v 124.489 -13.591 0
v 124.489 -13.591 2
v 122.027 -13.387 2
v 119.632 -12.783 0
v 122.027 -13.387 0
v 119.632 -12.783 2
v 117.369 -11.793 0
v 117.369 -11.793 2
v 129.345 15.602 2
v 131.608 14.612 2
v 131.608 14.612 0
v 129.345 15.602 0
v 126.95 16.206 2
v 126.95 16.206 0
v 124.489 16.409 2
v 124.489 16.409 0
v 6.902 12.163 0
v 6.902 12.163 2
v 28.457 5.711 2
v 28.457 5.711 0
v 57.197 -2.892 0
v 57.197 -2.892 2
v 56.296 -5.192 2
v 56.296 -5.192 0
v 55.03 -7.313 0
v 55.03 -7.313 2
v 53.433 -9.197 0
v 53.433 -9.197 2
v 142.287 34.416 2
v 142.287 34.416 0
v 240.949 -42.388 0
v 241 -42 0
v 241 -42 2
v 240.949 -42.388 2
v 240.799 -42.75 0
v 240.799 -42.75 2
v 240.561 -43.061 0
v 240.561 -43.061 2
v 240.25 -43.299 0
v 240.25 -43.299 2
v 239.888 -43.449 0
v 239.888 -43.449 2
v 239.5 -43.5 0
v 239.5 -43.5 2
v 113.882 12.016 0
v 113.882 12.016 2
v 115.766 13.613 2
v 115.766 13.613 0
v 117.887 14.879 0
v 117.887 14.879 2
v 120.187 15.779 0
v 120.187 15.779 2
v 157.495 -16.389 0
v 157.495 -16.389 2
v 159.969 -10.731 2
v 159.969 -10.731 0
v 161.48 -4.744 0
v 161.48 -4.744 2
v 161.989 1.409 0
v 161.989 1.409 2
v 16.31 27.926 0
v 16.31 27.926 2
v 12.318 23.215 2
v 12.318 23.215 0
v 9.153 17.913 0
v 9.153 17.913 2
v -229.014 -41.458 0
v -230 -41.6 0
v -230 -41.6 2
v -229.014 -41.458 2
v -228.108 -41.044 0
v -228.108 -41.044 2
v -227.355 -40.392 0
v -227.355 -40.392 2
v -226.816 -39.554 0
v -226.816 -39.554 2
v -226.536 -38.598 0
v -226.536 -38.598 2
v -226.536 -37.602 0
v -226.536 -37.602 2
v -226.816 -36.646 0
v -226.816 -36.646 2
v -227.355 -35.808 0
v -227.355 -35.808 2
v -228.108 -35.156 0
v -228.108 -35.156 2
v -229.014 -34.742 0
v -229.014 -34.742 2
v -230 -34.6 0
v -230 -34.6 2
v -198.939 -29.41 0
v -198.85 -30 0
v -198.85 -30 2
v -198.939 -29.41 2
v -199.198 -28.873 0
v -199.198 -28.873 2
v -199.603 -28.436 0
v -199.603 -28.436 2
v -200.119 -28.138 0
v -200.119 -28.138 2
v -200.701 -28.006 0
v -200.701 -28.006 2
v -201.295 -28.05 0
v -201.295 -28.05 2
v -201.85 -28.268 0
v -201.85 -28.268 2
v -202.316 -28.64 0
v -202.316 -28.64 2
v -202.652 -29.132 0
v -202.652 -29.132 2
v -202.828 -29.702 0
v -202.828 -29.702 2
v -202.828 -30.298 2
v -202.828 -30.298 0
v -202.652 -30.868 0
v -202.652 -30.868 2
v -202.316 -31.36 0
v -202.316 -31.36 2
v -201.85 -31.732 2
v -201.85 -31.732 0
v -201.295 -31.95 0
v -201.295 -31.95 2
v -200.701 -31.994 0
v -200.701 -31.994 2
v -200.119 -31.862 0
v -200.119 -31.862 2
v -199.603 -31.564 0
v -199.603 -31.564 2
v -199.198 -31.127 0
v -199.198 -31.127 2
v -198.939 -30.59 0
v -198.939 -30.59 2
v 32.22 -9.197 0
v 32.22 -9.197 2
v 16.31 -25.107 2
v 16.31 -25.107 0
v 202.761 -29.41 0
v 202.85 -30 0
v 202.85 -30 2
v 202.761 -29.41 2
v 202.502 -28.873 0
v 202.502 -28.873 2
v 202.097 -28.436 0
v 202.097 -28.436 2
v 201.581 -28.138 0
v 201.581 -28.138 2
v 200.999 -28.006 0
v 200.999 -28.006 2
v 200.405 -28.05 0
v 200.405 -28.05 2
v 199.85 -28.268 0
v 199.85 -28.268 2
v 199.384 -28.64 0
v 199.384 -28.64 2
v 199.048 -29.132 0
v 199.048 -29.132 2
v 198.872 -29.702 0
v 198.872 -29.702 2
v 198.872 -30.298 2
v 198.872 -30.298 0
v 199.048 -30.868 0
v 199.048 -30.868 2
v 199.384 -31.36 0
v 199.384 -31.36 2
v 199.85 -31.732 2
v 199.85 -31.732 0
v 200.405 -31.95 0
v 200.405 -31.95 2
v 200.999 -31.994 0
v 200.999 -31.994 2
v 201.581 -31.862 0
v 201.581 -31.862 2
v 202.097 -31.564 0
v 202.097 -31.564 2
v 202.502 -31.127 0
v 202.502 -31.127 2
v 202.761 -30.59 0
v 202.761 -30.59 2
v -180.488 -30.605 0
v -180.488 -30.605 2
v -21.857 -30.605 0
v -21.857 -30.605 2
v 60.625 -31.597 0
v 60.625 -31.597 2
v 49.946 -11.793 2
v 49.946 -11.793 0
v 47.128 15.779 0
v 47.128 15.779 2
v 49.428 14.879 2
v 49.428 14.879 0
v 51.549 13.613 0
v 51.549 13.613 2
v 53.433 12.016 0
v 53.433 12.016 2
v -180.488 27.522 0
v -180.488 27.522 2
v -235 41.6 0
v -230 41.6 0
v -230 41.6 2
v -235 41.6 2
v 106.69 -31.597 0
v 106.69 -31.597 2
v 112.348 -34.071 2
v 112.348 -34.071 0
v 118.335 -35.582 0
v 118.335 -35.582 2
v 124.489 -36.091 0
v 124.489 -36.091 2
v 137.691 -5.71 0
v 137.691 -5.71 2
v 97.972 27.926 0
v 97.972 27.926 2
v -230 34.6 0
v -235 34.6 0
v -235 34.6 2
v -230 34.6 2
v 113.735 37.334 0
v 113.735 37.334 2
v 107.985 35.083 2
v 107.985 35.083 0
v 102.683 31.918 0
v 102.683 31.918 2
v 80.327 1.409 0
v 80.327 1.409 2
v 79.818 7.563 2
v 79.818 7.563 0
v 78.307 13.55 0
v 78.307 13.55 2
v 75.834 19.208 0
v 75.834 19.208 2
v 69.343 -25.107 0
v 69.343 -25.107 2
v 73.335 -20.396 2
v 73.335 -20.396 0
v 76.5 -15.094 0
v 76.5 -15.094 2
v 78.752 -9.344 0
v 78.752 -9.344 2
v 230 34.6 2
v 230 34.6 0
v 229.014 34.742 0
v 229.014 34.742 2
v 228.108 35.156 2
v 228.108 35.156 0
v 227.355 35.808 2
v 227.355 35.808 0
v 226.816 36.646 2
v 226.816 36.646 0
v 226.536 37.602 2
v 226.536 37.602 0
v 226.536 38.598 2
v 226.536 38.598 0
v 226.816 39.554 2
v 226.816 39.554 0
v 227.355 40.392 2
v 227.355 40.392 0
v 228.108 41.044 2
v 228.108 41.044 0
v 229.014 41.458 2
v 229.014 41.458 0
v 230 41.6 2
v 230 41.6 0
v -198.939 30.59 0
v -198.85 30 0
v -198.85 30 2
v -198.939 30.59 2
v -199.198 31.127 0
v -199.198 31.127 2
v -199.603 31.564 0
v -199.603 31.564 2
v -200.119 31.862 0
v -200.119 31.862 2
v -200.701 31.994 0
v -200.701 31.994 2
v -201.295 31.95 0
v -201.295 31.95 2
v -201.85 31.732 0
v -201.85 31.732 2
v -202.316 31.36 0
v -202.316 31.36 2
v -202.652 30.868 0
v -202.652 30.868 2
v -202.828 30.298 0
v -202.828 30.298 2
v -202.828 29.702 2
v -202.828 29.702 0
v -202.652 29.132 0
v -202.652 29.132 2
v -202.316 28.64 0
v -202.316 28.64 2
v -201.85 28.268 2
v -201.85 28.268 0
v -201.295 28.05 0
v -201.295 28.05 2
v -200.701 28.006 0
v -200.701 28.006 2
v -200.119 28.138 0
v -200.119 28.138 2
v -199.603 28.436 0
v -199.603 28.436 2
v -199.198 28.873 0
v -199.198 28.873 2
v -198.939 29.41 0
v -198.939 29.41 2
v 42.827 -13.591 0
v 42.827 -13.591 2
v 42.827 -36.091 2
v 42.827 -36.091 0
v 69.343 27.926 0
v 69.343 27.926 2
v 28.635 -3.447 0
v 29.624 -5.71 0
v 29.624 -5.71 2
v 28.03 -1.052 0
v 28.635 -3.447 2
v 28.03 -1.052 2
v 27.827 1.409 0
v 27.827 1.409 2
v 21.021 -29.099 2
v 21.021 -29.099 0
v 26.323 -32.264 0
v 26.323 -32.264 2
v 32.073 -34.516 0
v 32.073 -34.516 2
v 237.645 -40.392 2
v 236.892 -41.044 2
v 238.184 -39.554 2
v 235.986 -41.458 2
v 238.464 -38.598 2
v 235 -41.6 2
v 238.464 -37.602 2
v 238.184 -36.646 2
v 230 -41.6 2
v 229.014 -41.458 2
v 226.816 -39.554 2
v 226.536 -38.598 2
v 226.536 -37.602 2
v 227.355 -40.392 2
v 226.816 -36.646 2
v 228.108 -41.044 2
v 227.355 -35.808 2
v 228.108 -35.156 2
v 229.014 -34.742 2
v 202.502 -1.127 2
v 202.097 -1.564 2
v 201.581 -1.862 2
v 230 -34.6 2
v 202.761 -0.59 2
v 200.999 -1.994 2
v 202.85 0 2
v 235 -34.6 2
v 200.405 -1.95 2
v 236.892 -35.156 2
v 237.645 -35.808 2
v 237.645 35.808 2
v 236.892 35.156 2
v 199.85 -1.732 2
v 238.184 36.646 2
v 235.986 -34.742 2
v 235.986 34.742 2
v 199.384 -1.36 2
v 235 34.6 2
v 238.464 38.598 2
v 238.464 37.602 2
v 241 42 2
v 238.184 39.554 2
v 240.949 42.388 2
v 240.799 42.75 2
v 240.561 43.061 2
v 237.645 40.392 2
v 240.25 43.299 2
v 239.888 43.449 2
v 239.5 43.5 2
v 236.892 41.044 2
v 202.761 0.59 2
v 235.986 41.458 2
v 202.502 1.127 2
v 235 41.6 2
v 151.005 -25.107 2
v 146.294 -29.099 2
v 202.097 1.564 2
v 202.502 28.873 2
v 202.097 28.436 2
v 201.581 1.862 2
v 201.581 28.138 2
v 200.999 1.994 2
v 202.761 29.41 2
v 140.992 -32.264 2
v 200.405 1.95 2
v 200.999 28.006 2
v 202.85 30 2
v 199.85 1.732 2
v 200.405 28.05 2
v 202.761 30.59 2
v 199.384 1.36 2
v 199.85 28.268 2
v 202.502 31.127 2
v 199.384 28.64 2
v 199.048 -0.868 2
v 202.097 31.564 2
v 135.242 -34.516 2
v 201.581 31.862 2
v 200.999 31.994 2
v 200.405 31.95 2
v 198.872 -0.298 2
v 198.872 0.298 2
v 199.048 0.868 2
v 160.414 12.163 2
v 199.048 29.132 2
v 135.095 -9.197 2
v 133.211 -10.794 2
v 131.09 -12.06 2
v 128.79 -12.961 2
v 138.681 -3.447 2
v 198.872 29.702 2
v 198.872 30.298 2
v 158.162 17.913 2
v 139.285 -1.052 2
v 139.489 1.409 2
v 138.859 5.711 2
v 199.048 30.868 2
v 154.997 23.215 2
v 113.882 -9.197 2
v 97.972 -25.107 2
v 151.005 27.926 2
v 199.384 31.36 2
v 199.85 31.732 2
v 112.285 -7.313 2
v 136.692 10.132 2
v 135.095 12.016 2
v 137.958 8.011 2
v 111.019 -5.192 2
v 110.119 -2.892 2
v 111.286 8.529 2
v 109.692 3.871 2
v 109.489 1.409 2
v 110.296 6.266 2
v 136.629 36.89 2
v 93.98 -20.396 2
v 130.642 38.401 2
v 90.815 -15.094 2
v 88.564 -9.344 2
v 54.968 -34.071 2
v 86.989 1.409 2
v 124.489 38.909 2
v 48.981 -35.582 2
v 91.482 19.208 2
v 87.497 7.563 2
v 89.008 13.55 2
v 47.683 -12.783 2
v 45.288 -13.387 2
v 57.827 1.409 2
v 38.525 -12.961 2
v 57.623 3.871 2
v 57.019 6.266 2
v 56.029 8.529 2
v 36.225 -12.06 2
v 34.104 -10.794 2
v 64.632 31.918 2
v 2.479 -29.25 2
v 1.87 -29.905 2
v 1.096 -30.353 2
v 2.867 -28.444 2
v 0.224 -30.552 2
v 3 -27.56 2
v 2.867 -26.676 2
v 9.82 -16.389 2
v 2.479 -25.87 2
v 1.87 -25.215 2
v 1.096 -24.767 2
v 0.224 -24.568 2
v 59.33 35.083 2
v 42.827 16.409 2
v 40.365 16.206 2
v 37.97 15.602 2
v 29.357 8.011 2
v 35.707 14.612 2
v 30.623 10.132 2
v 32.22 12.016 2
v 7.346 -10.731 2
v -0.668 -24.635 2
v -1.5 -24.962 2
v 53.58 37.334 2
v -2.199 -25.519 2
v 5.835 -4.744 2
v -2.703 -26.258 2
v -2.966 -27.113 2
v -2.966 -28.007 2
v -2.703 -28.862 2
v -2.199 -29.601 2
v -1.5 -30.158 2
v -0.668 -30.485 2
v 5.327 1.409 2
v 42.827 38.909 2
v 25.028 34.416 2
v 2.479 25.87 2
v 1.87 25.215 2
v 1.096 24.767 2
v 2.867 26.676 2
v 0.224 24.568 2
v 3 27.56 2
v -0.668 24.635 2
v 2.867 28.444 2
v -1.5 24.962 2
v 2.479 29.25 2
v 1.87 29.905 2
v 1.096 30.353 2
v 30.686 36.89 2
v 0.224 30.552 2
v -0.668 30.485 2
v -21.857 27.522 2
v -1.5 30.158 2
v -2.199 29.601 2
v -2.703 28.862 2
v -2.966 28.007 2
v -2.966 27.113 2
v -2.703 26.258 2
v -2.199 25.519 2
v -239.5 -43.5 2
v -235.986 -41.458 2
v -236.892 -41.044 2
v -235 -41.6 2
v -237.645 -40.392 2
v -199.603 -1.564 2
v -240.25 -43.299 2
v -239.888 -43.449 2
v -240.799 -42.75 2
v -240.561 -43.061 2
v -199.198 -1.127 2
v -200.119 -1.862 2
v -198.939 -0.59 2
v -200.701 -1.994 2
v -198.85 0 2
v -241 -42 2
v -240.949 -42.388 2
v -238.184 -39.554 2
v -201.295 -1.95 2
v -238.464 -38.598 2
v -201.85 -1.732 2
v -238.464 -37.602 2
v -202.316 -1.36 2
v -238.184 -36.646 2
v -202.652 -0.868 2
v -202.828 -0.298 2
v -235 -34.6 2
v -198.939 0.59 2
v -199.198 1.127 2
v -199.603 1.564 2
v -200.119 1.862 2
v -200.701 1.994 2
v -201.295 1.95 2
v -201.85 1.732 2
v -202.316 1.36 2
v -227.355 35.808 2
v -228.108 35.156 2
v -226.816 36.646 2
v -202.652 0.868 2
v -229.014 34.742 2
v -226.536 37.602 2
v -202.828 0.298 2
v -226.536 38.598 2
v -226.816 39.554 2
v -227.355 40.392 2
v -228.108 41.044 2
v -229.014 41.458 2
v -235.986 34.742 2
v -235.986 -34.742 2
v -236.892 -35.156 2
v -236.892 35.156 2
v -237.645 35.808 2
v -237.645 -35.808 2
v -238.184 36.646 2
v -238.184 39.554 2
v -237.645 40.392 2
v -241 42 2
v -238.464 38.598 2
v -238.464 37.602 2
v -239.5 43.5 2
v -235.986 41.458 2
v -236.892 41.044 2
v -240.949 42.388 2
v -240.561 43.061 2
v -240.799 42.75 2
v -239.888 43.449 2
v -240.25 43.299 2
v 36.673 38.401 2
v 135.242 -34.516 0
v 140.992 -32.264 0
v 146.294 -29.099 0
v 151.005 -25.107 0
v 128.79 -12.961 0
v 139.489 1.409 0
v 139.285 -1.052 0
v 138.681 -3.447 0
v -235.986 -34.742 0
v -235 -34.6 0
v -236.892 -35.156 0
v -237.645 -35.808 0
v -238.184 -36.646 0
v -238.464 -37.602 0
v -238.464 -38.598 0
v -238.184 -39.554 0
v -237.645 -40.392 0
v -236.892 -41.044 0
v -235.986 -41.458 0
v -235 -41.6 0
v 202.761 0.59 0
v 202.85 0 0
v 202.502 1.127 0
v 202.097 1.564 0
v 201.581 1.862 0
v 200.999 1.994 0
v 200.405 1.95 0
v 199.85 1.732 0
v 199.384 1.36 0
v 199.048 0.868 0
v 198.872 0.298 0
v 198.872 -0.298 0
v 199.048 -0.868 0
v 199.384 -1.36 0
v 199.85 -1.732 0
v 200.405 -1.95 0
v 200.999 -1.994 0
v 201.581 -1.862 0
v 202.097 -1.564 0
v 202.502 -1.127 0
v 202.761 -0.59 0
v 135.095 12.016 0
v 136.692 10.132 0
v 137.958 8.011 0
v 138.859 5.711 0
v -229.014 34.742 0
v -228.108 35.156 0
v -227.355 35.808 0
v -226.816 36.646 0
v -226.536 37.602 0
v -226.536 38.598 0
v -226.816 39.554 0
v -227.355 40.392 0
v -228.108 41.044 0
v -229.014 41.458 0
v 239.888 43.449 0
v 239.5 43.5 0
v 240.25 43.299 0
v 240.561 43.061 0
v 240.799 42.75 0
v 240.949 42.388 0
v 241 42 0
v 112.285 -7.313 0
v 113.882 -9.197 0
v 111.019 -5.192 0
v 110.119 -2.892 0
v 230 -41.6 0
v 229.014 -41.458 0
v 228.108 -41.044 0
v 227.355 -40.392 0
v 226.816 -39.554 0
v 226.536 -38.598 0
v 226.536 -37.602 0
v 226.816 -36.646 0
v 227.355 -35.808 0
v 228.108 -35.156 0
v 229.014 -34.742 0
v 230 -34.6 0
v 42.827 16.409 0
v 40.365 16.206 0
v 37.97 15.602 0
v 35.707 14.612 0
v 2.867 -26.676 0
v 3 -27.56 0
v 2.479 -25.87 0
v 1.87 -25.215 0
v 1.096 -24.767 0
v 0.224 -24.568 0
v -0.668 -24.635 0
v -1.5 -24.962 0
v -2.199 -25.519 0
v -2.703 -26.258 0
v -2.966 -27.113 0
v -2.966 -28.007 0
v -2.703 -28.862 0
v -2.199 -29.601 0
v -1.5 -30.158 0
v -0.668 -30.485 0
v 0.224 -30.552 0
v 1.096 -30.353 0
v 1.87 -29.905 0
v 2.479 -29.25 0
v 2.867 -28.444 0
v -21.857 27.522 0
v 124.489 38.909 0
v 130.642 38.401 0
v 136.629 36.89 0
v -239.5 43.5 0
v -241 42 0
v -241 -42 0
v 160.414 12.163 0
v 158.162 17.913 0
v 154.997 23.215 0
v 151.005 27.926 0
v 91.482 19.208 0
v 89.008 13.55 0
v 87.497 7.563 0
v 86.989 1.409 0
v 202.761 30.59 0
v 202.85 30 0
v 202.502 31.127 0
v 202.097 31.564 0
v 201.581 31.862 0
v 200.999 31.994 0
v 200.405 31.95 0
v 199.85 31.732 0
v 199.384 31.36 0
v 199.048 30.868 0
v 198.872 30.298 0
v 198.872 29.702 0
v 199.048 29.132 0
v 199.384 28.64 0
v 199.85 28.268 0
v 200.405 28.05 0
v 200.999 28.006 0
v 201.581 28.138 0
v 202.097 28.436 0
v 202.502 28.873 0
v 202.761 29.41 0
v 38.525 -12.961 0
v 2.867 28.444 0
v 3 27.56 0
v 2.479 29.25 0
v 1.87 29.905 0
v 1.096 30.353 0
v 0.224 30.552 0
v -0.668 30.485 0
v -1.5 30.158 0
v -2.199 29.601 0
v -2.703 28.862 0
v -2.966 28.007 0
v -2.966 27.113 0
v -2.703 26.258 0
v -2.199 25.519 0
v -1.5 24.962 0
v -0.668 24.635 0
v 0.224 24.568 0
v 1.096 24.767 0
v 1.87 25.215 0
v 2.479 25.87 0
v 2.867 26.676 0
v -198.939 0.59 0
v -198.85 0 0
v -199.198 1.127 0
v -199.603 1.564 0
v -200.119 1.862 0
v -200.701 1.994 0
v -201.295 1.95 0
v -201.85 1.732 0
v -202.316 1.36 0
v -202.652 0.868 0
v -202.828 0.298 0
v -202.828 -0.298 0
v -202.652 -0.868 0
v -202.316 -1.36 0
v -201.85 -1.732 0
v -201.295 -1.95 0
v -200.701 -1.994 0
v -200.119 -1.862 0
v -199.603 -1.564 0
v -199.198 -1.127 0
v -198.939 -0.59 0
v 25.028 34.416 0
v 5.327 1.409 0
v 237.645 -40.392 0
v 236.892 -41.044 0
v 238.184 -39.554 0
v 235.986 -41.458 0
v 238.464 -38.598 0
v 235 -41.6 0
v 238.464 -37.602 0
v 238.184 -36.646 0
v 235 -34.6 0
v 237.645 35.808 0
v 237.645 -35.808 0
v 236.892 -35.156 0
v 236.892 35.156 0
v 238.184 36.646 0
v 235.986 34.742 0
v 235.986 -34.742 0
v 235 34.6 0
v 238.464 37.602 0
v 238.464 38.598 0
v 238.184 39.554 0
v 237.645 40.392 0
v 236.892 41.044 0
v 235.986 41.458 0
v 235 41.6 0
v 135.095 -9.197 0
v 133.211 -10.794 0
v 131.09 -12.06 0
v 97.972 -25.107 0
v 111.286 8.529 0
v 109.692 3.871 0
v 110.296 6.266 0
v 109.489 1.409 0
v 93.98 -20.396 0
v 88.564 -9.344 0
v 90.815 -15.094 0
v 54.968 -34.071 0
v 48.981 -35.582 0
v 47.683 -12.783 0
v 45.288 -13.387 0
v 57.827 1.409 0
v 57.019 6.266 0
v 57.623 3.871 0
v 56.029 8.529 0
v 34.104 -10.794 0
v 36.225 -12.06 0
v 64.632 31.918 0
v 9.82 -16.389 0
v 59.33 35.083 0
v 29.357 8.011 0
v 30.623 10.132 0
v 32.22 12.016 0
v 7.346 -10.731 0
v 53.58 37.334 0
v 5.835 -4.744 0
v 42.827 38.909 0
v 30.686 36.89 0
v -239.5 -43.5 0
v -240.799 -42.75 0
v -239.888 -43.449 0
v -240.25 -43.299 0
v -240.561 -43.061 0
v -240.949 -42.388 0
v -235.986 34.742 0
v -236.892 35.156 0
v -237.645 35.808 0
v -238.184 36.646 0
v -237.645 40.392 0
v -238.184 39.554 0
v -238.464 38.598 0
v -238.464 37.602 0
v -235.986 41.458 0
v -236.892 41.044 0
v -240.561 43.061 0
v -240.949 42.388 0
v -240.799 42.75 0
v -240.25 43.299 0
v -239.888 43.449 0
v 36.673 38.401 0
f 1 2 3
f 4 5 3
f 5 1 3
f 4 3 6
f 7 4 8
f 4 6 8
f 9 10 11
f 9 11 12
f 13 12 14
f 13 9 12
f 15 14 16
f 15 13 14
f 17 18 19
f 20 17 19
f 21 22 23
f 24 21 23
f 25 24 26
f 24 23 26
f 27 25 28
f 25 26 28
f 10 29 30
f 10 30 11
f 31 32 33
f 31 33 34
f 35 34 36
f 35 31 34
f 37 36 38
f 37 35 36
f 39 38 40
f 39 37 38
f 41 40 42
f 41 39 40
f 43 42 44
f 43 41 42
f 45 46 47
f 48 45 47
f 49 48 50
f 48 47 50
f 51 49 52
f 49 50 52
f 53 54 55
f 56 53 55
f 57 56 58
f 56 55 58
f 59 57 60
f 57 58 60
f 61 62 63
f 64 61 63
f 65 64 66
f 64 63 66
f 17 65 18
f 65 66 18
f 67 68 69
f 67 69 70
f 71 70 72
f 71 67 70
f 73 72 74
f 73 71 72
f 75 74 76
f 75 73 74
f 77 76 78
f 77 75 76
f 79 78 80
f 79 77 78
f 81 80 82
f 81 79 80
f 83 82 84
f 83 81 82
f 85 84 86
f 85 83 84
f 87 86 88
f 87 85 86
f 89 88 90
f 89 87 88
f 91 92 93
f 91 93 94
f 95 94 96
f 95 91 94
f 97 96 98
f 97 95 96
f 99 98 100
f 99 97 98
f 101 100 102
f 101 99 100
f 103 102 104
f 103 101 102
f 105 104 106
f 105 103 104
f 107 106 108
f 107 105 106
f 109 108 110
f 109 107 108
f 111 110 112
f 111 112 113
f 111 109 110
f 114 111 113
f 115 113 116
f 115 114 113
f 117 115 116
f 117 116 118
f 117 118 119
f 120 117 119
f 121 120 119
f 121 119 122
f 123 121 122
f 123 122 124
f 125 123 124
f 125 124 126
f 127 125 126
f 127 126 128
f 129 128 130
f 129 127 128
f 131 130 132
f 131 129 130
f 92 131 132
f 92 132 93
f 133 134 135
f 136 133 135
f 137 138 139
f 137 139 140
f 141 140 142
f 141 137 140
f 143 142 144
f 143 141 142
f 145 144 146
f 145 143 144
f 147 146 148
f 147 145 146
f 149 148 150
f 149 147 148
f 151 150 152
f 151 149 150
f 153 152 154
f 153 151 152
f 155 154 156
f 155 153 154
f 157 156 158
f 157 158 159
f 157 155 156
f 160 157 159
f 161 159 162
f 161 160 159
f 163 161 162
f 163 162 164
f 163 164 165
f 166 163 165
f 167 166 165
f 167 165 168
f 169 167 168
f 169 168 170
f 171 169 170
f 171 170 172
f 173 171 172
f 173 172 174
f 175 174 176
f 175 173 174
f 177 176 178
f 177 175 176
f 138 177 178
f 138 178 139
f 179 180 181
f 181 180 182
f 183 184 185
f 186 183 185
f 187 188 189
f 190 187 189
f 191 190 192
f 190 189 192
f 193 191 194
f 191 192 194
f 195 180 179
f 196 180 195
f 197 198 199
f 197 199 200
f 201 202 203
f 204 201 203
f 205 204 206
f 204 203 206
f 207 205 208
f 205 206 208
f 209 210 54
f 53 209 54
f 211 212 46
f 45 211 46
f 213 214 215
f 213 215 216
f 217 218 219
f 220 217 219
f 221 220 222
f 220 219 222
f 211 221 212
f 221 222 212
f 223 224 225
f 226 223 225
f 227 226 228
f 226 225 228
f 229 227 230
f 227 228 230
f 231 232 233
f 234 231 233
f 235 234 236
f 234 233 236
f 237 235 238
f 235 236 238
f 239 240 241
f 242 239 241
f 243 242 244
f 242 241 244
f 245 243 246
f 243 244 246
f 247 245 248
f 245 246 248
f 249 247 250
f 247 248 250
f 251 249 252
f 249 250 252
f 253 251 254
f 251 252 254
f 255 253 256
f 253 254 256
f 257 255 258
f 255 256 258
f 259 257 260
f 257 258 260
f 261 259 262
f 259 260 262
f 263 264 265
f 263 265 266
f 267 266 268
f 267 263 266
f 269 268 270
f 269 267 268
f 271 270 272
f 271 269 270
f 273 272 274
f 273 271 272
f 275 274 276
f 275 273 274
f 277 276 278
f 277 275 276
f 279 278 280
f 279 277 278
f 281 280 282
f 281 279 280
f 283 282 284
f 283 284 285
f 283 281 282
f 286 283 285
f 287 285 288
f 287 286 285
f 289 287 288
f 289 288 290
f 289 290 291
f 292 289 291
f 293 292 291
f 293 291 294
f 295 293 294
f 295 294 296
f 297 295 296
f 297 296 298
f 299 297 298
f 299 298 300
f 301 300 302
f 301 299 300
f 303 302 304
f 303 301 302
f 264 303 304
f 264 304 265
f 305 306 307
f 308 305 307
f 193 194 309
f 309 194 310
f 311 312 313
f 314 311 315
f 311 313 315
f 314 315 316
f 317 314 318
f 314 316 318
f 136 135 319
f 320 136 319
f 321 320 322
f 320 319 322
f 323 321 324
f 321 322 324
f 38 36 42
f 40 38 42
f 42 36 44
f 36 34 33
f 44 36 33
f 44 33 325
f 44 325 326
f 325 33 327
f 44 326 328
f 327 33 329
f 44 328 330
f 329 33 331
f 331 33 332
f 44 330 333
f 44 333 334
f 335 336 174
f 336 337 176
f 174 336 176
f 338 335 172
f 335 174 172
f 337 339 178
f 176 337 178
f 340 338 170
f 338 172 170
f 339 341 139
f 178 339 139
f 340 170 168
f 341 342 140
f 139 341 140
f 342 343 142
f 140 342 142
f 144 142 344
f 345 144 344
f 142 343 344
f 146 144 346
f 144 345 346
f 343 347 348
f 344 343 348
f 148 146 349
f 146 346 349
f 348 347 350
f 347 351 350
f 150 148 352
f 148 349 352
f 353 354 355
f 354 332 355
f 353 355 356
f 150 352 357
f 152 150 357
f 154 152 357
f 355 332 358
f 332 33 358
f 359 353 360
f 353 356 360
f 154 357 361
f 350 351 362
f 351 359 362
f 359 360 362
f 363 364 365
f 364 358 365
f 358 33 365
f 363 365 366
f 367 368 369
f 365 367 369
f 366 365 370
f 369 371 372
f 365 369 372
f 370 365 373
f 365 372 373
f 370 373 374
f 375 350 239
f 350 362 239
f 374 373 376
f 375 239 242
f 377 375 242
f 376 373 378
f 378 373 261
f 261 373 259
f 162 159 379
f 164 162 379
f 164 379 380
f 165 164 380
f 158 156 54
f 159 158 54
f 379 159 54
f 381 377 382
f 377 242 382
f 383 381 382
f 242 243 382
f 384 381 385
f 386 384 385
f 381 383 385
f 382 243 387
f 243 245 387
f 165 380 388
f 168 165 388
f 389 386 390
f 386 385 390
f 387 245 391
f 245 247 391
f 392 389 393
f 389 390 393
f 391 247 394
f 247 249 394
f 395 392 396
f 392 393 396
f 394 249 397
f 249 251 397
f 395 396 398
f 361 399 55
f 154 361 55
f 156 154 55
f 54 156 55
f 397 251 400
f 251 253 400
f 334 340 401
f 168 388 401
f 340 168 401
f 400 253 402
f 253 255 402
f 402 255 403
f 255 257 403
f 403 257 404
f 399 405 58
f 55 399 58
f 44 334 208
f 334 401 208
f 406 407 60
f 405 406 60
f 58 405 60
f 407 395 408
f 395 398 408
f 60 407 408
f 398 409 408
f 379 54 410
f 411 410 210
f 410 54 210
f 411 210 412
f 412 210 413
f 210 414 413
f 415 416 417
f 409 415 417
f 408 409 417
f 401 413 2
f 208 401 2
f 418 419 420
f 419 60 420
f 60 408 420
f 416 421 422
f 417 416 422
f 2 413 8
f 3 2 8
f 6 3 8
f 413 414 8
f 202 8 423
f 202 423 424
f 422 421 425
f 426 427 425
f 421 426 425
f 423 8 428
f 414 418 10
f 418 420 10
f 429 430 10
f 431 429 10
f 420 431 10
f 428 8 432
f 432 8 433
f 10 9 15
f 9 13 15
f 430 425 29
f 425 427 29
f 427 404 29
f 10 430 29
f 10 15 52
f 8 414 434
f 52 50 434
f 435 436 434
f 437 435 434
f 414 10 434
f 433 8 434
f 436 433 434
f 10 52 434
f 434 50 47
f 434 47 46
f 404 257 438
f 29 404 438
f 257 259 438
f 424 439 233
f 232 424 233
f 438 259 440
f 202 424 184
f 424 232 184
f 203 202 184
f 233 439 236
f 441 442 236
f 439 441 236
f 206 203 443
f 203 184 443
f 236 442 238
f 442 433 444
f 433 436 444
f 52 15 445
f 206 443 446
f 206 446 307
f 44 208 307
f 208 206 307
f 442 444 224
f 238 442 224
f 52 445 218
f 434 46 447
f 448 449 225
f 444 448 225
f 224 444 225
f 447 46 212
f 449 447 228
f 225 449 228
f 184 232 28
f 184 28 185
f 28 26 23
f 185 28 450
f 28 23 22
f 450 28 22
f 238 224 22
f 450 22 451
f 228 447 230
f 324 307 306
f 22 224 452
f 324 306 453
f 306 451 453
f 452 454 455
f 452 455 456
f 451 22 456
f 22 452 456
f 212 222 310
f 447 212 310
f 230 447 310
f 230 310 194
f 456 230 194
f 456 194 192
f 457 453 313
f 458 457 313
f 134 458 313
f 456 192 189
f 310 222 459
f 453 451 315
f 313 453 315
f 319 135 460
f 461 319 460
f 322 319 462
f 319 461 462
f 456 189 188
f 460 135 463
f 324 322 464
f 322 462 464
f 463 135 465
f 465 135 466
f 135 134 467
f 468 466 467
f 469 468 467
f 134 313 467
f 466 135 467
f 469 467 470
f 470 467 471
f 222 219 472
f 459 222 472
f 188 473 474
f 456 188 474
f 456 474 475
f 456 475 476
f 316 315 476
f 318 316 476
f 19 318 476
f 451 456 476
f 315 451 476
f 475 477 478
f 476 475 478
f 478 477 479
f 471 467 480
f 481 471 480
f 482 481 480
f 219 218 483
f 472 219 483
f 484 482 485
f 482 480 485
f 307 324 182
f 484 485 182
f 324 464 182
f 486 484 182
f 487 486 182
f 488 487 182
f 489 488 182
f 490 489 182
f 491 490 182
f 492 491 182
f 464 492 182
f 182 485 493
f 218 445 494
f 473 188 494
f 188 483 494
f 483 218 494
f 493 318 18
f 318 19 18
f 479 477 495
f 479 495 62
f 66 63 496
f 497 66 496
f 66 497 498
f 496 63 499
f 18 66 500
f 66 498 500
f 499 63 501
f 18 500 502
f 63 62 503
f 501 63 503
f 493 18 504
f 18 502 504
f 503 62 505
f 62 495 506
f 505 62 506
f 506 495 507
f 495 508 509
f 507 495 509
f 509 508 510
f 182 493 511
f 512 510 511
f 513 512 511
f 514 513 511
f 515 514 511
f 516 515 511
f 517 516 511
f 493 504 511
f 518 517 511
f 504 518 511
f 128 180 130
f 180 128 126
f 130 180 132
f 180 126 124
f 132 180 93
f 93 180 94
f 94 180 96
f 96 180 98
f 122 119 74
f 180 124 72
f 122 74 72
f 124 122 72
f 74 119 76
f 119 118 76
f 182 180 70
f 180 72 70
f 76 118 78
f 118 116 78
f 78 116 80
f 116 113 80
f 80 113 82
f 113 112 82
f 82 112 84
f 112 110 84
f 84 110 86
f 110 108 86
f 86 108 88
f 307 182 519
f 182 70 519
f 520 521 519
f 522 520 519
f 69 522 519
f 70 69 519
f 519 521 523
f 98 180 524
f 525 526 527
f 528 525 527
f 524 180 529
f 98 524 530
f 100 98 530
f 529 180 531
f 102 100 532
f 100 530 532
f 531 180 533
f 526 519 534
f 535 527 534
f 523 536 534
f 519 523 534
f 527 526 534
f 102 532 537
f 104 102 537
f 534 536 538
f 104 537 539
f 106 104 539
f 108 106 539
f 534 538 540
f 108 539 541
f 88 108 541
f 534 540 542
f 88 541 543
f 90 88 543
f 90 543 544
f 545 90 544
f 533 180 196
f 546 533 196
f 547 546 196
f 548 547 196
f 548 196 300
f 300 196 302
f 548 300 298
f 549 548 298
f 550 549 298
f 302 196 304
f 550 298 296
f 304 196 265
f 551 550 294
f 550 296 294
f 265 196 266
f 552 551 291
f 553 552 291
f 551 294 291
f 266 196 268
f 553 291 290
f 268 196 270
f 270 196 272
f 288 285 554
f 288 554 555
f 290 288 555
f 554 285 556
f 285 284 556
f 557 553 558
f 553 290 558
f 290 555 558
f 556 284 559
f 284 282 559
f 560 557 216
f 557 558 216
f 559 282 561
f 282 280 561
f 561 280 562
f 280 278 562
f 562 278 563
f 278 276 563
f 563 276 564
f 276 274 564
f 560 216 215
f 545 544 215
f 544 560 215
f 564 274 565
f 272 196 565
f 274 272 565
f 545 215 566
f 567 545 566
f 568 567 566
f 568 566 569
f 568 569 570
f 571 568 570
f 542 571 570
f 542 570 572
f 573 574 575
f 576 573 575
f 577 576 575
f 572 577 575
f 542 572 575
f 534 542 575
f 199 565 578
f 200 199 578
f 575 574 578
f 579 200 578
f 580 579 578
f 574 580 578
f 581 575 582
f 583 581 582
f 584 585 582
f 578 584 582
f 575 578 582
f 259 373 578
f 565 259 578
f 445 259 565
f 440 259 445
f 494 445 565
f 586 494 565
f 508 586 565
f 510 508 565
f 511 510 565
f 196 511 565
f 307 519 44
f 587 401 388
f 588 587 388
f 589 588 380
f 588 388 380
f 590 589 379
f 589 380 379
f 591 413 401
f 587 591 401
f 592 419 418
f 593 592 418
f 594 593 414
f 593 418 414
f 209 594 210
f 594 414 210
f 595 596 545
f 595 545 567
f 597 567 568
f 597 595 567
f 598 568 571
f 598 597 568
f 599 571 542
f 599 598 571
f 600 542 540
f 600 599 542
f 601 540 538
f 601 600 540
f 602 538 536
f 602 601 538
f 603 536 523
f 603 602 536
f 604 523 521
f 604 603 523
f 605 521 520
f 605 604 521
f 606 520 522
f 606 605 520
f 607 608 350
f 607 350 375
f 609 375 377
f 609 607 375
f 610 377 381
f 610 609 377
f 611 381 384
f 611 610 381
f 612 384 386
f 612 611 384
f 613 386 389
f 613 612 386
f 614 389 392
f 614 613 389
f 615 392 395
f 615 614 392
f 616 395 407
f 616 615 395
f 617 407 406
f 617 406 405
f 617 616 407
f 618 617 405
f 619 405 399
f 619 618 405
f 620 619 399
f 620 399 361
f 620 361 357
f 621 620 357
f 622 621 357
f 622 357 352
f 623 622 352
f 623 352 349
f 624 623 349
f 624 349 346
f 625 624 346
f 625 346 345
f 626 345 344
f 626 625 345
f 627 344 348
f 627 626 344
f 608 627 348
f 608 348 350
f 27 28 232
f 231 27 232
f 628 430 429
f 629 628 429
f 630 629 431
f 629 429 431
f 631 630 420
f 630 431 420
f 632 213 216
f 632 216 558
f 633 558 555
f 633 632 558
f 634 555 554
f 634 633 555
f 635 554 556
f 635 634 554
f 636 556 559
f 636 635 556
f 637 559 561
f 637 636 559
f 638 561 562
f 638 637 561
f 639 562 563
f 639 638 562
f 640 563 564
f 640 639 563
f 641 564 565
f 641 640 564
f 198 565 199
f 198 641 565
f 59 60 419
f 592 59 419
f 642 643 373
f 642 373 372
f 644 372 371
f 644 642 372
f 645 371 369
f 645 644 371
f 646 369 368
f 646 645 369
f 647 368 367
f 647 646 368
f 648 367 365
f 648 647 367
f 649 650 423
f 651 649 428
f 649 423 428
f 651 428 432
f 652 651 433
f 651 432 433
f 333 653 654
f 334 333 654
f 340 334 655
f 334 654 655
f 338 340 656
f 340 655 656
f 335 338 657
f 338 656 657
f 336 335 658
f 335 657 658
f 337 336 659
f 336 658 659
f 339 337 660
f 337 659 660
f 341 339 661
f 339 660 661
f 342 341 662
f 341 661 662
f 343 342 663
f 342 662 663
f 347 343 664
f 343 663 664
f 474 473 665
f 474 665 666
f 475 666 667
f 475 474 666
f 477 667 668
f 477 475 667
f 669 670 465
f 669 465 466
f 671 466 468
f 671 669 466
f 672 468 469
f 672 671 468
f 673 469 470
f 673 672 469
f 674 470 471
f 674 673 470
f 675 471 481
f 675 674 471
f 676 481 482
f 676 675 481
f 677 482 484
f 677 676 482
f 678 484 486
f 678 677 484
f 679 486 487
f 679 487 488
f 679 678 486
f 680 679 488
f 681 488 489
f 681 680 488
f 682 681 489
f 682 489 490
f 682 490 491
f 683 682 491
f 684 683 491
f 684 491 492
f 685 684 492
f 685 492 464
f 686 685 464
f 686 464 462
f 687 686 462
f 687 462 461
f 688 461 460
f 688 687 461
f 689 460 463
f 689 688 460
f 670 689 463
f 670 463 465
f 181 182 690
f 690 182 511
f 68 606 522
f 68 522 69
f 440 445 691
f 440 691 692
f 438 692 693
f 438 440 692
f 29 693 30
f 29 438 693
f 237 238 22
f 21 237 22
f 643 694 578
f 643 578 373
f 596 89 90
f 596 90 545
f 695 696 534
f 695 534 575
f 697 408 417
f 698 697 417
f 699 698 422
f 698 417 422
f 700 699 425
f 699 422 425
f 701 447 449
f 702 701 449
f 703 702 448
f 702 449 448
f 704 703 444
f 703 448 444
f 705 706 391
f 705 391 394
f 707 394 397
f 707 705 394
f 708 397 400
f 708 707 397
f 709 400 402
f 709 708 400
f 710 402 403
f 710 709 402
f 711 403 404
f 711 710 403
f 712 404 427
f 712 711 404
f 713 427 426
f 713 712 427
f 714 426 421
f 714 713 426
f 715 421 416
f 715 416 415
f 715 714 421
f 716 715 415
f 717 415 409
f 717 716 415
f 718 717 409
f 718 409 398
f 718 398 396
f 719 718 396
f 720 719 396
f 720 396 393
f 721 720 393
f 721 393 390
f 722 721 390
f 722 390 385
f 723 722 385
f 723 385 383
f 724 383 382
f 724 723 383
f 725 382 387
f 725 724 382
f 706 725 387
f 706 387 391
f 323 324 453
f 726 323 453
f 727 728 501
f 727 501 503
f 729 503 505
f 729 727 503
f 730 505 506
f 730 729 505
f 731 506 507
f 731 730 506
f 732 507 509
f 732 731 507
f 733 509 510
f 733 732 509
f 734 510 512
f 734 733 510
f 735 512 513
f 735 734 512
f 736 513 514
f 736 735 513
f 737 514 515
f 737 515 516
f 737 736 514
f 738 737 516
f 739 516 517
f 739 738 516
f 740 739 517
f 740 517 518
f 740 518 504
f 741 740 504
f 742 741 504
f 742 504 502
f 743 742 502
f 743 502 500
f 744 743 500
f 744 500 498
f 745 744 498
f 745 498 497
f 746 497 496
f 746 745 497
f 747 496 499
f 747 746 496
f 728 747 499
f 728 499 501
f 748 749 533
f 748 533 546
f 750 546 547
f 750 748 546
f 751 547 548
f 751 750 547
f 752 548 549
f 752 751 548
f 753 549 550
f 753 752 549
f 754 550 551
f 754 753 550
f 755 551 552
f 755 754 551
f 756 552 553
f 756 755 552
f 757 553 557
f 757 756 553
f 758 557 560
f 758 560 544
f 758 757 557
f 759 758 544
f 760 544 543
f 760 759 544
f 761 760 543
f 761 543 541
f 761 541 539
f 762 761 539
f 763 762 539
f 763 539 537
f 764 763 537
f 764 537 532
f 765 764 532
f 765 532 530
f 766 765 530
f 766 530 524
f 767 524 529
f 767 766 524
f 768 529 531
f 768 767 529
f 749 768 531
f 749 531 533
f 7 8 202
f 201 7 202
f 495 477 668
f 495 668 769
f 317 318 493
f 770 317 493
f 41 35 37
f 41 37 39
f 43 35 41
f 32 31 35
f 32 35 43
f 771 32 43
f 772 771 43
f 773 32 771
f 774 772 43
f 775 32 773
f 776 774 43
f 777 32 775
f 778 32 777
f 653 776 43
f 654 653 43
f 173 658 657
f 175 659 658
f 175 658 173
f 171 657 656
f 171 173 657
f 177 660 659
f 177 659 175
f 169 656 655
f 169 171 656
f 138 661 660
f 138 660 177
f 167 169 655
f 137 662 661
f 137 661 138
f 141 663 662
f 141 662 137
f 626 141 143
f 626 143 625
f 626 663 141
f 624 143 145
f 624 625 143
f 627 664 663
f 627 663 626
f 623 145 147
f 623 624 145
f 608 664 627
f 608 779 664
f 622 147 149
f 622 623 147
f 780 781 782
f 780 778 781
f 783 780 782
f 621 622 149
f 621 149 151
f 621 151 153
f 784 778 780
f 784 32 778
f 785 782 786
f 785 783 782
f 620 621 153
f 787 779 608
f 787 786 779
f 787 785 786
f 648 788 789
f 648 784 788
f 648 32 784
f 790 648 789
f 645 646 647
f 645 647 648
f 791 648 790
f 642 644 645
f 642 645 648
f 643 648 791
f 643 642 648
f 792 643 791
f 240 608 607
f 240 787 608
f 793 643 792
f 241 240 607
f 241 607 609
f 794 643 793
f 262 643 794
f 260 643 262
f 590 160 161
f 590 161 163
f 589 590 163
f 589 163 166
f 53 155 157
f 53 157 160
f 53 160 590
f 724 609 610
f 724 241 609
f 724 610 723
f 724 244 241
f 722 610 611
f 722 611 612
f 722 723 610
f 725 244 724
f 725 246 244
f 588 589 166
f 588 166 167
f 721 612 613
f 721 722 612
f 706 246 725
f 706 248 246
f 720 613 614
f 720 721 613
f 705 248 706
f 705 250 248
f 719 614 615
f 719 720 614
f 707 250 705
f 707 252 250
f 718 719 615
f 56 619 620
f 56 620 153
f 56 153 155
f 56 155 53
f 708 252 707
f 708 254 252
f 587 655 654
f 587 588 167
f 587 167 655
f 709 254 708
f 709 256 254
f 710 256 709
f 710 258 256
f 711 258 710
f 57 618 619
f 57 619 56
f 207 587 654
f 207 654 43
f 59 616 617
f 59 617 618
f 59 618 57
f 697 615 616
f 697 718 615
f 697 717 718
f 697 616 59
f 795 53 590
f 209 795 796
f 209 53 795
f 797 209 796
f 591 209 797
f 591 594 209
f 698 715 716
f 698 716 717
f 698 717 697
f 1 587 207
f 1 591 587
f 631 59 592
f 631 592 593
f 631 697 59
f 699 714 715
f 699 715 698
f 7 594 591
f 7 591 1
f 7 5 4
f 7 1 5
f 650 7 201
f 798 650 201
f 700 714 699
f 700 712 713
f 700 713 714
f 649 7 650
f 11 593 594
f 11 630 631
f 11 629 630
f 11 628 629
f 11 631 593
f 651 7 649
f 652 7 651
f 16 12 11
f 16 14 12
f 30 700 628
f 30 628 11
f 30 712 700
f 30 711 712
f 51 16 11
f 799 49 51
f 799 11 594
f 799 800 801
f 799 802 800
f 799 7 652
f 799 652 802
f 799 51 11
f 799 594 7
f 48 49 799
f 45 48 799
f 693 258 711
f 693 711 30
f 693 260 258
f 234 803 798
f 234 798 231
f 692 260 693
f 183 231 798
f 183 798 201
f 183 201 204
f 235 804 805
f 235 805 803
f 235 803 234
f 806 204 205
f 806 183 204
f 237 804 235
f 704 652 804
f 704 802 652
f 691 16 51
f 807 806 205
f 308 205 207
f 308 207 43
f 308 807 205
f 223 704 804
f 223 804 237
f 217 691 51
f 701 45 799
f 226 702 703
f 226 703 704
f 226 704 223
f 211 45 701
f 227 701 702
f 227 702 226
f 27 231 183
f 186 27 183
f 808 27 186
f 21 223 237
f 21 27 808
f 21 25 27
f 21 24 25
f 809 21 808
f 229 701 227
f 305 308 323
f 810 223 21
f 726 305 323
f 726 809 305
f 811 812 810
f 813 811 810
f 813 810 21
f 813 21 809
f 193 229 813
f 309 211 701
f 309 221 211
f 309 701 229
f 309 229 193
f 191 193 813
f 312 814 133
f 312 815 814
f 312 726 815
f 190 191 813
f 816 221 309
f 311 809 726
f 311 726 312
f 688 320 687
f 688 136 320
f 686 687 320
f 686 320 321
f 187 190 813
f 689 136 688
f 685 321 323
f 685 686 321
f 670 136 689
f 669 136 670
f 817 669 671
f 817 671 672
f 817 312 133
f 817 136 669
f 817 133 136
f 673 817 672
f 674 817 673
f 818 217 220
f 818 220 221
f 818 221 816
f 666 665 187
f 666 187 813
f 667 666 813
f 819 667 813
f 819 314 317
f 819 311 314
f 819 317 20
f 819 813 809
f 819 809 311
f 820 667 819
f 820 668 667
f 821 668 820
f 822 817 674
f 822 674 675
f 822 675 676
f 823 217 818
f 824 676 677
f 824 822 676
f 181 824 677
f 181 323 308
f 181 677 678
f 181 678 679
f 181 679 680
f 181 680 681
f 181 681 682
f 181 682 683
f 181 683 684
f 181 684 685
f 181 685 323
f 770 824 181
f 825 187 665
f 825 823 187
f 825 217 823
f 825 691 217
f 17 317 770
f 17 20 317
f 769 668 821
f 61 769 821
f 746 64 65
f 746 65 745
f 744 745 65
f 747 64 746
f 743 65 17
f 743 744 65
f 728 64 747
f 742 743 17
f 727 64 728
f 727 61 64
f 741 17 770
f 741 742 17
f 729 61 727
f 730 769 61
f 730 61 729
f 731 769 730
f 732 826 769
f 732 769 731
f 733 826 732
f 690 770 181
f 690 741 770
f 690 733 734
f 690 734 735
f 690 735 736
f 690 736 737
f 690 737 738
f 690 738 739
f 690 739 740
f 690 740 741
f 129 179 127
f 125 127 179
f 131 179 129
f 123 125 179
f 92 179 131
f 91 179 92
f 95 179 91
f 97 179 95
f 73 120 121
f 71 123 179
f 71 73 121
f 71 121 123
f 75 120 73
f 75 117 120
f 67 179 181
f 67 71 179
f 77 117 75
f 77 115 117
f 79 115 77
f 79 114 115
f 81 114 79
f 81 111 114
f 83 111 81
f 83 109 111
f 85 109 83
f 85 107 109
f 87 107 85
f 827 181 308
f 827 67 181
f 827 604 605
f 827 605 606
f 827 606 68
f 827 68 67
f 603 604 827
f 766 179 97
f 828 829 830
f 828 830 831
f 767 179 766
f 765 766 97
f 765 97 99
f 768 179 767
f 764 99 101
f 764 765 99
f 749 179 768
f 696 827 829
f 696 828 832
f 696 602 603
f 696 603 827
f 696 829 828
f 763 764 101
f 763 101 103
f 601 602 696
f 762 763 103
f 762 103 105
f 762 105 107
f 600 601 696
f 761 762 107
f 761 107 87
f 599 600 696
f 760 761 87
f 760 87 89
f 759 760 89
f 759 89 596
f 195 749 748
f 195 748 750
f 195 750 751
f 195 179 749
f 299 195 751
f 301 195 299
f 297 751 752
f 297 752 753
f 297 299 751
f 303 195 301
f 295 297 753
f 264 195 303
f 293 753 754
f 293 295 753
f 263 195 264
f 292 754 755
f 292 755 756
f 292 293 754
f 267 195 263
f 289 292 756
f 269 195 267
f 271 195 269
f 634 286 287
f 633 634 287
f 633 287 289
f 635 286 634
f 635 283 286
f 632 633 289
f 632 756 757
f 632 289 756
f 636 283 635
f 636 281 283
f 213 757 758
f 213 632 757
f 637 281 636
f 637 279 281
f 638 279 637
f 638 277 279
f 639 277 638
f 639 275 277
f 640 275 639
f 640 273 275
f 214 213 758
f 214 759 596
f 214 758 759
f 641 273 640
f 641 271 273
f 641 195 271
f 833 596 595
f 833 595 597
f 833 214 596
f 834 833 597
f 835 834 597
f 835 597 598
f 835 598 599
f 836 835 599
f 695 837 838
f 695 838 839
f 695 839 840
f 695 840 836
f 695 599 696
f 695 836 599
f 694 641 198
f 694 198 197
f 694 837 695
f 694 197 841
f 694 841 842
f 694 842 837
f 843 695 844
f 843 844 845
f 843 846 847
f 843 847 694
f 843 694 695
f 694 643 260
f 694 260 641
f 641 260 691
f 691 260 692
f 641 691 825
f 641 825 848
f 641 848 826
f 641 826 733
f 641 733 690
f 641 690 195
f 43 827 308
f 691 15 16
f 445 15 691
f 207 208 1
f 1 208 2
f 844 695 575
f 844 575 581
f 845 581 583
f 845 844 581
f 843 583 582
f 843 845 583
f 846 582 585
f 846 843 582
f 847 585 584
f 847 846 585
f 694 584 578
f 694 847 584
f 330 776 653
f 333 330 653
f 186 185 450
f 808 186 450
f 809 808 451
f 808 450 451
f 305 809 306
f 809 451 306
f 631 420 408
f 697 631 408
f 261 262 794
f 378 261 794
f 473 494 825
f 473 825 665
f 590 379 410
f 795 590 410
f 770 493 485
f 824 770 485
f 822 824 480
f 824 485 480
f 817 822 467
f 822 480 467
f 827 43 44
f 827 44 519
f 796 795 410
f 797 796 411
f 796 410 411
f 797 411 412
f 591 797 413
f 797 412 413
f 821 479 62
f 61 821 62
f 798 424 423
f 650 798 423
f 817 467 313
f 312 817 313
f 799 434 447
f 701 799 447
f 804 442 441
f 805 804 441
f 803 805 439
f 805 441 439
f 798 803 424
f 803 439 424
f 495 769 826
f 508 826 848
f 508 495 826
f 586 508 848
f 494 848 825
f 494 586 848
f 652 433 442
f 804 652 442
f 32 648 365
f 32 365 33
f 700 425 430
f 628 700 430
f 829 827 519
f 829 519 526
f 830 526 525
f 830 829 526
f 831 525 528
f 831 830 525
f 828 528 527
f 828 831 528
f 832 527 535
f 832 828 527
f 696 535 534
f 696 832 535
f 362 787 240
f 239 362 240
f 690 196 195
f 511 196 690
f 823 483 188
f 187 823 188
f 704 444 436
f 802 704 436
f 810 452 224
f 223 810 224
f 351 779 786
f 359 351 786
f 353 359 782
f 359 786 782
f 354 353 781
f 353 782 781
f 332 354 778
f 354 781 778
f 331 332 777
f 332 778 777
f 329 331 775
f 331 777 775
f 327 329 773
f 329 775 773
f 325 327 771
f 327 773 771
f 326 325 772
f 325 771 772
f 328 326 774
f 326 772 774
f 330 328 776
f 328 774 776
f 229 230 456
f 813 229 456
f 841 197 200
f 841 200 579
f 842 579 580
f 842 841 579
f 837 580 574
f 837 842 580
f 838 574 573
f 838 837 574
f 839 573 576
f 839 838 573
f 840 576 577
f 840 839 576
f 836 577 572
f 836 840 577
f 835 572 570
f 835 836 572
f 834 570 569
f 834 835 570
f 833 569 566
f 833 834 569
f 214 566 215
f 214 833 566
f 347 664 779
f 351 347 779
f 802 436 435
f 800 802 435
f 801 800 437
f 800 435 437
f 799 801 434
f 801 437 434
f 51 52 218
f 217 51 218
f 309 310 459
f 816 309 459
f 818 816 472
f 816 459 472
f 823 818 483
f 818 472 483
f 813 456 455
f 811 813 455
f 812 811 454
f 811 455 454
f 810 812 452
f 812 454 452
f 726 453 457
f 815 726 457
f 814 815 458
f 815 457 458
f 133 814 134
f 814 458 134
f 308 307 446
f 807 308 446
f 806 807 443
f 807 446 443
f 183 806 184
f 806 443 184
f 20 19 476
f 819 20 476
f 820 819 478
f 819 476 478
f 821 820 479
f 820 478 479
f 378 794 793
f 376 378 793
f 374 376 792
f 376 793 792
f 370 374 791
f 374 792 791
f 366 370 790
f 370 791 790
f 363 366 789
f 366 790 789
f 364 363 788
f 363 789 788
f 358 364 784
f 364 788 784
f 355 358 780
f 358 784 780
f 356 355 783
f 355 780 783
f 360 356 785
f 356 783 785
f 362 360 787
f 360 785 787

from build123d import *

# Parameters (mm, degrees)
SKETCH1_R           = 2
SKETCH1_R_2         = 3
BOSS_EXTRUDE1_DEPTH = 2
CUT_EXTRUDE1_DEPTH  = 3
SKETCH3_W           = 158.631483428
SKETCH3_H           = 58.126698801
CUT_EXTRUDE2_DEPTH  = 3


with BuildPart() as part:
    # Sketch1 → Boss-Extrude1 (new body)
    with BuildSketch(Plane.XY):
        with BuildLine():
            Line((236, -43.5), (-236, -43.5))
            Line((-236, -43.5), (-239.5, -43.5))
            ThreePointArc((-239.5, -43.5), (-240.560660172, -43.060660172), (-241, -42))
            Line((-241, -42), (-241, -38.5))
            Line((-241, -38.5), (-241, 38.5))
            Line((-241, 38.5), (-241, 42))
            ThreePointArc((-241, 42), (-240.560660172, 43.060660172), (-239.5, 43.5))
            Line((-239.5, 43.5), (-236, 43.5))
            Line((-236, 43.5), (236, 43.5))
            Line((236, 43.5), (239.5, 43.5))
            ThreePointArc((239.5, 43.5), (240.560660172, 43.060660172), (241, 42))
            Line((241, 42), (241, 38.5))
            Line((241, 38.5), (241, -38.5))
            Line((241, -38.5), (241, -42))
            ThreePointArc((241, -42), (240.560660172, -43.060660172), (239.5, -43.5))
            Line((239.5, -43.5), (236, -43.5))
        make_face()
        with Locations((-200.85, 30)):
            Circle(SKETCH1_R, mode=Mode.SUBTRACT)
        with Locations((-200.85, 0)):
            Circle(SKETCH1_R, mode=Mode.SUBTRACT)
        with Locations((-200.85, -30)):
            Circle(SKETCH1_R, mode=Mode.SUBTRACT)
        with Locations((200.85, 30)):
            Circle(SKETCH1_R, mode=Mode.SUBTRACT)
        with Locations((200.85, 0)):
            Circle(SKETCH1_R, mode=Mode.SUBTRACT)
        with Locations((200.85, -30)):
            Circle(SKETCH1_R, mode=Mode.SUBTRACT)
        with Locations((0, -27.56)):
            Circle(SKETCH1_R_2, mode=Mode.SUBTRACT)
        with Locations((0, 27.56)):
            Circle(SKETCH1_R_2, mode=Mode.SUBTRACT)
        with BuildLine():
            Line((-235, 34.6), (-230, 34.6))
            ThreePointArc((-230, 34.6), (-226.5, 38.1), (-230, 41.6))
            Line((-230, 41.6), (-235, 41.6))
            ThreePointArc((-235, 41.6), (-238.5, 38.1), (-235, 34.6))
        make_face(mode=Mode.SUBTRACT)
        with BuildLine():
            Line((-235, -41.6), (-230, -41.6))
            ThreePointArc((-230, -41.6), (-226.5, -38.1), (-230, -34.6))
            Line((-230, -34.6), (-235, -34.6))
            ThreePointArc((-235, -34.6), (-238.5, -38.1), (-235, -41.6))
        make_face(mode=Mode.SUBTRACT)
        with BuildLine():
            Line((235, -41.6), (230, -41.6))
            ThreePointArc((230, -41.6), (226.5, -38.1), (230, -34.6))
            Line((230, -34.6), (235, -34.6))
            ThreePointArc((235, -34.6), (238.5, -38.1), (235, -41.6))
        make_face(mode=Mode.SUBTRACT)
        with BuildLine():
            Line((230, 41.6), (235, 41.6))
            ThreePointArc((235, 41.6), (238.5, 38.1), (235, 34.6))
            Line((235, 34.6), (230, 34.6))
            ThreePointArc((230, 34.6), (226.5, 38.1), (230, 41.6))
        make_face(mode=Mode.SUBTRACT)
    extrude(amount=BOSS_EXTRUDE1_DEPTH)

    # Sketch2 → Cut-Extrude1 (cut)
    with BuildSketch(Plane.XY.offset(2)):
        with BuildLine():
            Line((124.488551372, 16.409445117), (124.488551372, 38.909445117))
            ThreePointArc((124.488551372, 38.909445117), (133.667112168, 37.768818347), (142.28730965, 34.416326275))
            Line((142.28730965, 34.416326275), (131.608054683, 14.61219758))
            ThreePointArc((131.608054683, 14.61219758), (128.159975691, 15.953194409), (124.488551372, 16.409445117))
        make_face()
        with BuildLine():
            Line((138.858556239, 5.710951844), (160.41356354, 12.163211934))
            ThreePointArc((160.41356354, 12.163211934), (156.688733324, 20.629181907), (151.005055666, 27.925949412))
            Line((151.005055666, 27.925949412), (135.09515309, 12.016046835))
            ThreePointArc((135.09515309, 12.016046835), (137.368624153, 9.097339833), (138.858556239, 5.710951844))
        make_face()
        with BuildLine():
            Line((137.691303835, -5.710058194), (157.49543253, -16.389313161))
            ThreePointArc((157.49543253, -16.389313161), (160.847924602, -7.769115679), (161.988551372, 1.409445117))
            Line((161.988551372, 1.409445117), (139.488551372, 1.409445117))
            ThreePointArc((139.488551372, 1.409445117), (139.032300664, -2.261979201), (137.691303835, -5.710058194))
        make_face()
        with BuildLine():
            Line((128.790058099, -12.96055975), (135.242318189, -34.51556705))
            ThreePointArc((135.242318189, -34.51556705), (143.708288162, -30.790736834), (151.005055666, -25.107059177))
            Line((151.005055666, -25.107059177), (135.09515309, -9.197156601))
            ThreePointArc((135.09515309, -9.197156601), (132.176446088, -11.470627664), (128.790058099, -12.96055975))
        make_face()
        with BuildLine():
            Line((117.369048061, -11.793307346), (106.689793094, -31.59743604))
            ThreePointArc((106.689793094, -31.59743604), (115.309990575, -34.949928113), (124.488551372, -36.090554883))
            Line((124.488551372, -36.090554883), (124.488551372, -13.590554883))
            ThreePointArc((124.488551372, -13.590554883), (120.817127053, -13.134304175), (117.369048061, -11.793307346))
        make_face()
        with BuildLine():
            Line((110.118546505, -2.89206161), (88.563539204, -9.3443217))
            ThreePointArc((88.563539204, -9.3443217), (92.28836942, -17.810291673), (97.972047077, -25.107059177))
            Line((97.972047077, -25.107059177), (113.881949654, -9.197156601))
            ThreePointArc((113.881949654, -9.197156601), (111.608478591, -6.278449599), (110.118546505, -2.89206161))
        make_face()
        with BuildLine():
            Line((111.285798909, 8.528948428), (91.481670214, 19.208203395))
            ThreePointArc((91.481670214, 19.208203395), (88.129178142, 10.588005914), (86.988551372, 1.409445117))
            Line((86.988551372, 1.409445117), (109.488551372, 1.409445117))
            ThreePointArc((109.488551372, 1.409445117), (109.94480208, 5.080869436), (111.285798909, 8.528948428))
        make_face()
        with BuildLine():
            Line((120.187044645, 15.779449984), (113.734784555, 37.334457285))
            ThreePointArc((113.734784555, 37.334457285), (105.268814582, 33.609627069), (97.972047077, 27.925949412))
            Line((97.972047077, 27.925949412), (113.881949654, 12.016046835))
            ThreePointArc((113.881949654, 12.016046835), (116.800656656, 14.289517898), (120.187044645, 15.779449984))
        make_face()
        with BuildLine():
            Line((53.433328256, 12.016046835), (69.343230833, 27.925949412))
            ThreePointArc((69.343230833, 27.925949412), (62.046463328, 33.609627069), (53.580493355, 37.334457285))
            Line((53.580493355, 37.334457285), (47.128233265, 15.779449984))
            ThreePointArc((47.128233265, 15.779449984), (50.514621254, 14.289517898), (53.433328256, 12.016046835))
        make_face()
        with BuildLine():
            Line((57.826726538, 1.409445117), (80.326726538, 1.409445117))
            ThreePointArc((80.326726538, 1.409445117), (79.186099769, 10.588005914), (75.833607696, 19.208203395))
            Line((75.833607696, 19.208203395), (56.029479001, 8.528948428))
            ThreePointArc((56.029479001, 8.528948428), (57.37047583, 5.080869436), (57.826726538, 1.409445117))
        make_face()
        with BuildLine():
            Line((53.433328256, -9.197156601), (69.343230833, -25.107059177))
            ThreePointArc((69.343230833, -25.107059177), (75.02690849, -17.810291673), (78.751738706, -9.3443217))
            Line((78.751738706, -9.3443217), (57.196731405, -2.89206161))
            ThreePointArc((57.196731405, -2.89206161), (55.706799319, -6.278449599), (53.433328256, -9.197156601))
        make_face()
        with BuildLine():
            Line((42.826726538, -13.590554883), (42.826726538, -36.090554883))
            ThreePointArc((42.826726538, -36.090554883), (52.005287335, -34.949928113), (60.625484817, -31.59743604))
            Line((60.625484817, -31.59743604), (49.94622985, -11.793307346))
            ThreePointArc((49.94622985, -11.793307346), (46.498150857, -13.134304175), (42.826726538, -13.590554883))
        make_face()
        with BuildLine():
            Line((32.22012482, -9.197156601), (16.310222244, -25.107059177))
            ThreePointArc((16.310222244, -25.107059177), (23.606989748, -30.790736834), (32.072959721, -34.51556705))
            Line((32.072959721, -34.51556705), (38.525219811, -12.96055975))
            ThreePointArc((38.525219811, -12.96055975), (35.138831822, -11.470627664), (32.22012482, -9.197156601))
        make_face()
        with BuildLine():
            Line((27.826726538, 1.409445117), (5.326726538, 1.409445117))
            ThreePointArc((5.326726538, 1.409445117), (6.467353308, -7.769115679), (9.819845381, -16.389313161))
            Line((9.819845381, -16.389313161), (29.623974075, -5.710058194))
            ThreePointArc((29.623974075, -5.710058194), (28.282977246, -2.261979201), (27.826726538, 1.409445117))
        make_face()
        with BuildLine():
            Line((32.22012482, 12.016046835), (16.310222244, 27.925949412))
            ThreePointArc((16.310222244, 27.925949412), (10.626544587, 20.629181907), (6.901714371, 12.163211934))
            Line((6.901714371, 12.163211934), (28.456721671, 5.710951844))
            ThreePointArc((28.456721671, 5.710951844), (29.946653758, 9.097339833), (32.22012482, 12.016046835))
        make_face()
        with BuildLine():
            Line((35.707223227, 14.61219758), (25.02796826, 34.416326275))
            ThreePointArc((25.02796826, 34.416326275), (33.648165742, 37.768818347), (42.826726538, 38.909445117))
            Line((42.826726538, 38.909445117), (42.826726538, 16.409445117))
            ThreePointArc((42.826726538, 16.409445117), (39.15530222, 15.953194409), (35.707223227, 14.61219758))
        make_face()
    extrude(amount=-CUT_EXTRUDE1_DEPTH, mode=Mode.SUBTRACT)

    # Sketch3 → Cut-Extrude2 (cut)
    with BuildSketch(Plane.XY.offset(2)):
        with Locations((-101.172577856, -1.541774354)):
            Rectangle(SKETCH3_W, SKETCH3_H)
    extrude(amount=-CUT_EXTRUDE2_DEPTH, mode=Mode.SUBTRACT)


solid = part.part
